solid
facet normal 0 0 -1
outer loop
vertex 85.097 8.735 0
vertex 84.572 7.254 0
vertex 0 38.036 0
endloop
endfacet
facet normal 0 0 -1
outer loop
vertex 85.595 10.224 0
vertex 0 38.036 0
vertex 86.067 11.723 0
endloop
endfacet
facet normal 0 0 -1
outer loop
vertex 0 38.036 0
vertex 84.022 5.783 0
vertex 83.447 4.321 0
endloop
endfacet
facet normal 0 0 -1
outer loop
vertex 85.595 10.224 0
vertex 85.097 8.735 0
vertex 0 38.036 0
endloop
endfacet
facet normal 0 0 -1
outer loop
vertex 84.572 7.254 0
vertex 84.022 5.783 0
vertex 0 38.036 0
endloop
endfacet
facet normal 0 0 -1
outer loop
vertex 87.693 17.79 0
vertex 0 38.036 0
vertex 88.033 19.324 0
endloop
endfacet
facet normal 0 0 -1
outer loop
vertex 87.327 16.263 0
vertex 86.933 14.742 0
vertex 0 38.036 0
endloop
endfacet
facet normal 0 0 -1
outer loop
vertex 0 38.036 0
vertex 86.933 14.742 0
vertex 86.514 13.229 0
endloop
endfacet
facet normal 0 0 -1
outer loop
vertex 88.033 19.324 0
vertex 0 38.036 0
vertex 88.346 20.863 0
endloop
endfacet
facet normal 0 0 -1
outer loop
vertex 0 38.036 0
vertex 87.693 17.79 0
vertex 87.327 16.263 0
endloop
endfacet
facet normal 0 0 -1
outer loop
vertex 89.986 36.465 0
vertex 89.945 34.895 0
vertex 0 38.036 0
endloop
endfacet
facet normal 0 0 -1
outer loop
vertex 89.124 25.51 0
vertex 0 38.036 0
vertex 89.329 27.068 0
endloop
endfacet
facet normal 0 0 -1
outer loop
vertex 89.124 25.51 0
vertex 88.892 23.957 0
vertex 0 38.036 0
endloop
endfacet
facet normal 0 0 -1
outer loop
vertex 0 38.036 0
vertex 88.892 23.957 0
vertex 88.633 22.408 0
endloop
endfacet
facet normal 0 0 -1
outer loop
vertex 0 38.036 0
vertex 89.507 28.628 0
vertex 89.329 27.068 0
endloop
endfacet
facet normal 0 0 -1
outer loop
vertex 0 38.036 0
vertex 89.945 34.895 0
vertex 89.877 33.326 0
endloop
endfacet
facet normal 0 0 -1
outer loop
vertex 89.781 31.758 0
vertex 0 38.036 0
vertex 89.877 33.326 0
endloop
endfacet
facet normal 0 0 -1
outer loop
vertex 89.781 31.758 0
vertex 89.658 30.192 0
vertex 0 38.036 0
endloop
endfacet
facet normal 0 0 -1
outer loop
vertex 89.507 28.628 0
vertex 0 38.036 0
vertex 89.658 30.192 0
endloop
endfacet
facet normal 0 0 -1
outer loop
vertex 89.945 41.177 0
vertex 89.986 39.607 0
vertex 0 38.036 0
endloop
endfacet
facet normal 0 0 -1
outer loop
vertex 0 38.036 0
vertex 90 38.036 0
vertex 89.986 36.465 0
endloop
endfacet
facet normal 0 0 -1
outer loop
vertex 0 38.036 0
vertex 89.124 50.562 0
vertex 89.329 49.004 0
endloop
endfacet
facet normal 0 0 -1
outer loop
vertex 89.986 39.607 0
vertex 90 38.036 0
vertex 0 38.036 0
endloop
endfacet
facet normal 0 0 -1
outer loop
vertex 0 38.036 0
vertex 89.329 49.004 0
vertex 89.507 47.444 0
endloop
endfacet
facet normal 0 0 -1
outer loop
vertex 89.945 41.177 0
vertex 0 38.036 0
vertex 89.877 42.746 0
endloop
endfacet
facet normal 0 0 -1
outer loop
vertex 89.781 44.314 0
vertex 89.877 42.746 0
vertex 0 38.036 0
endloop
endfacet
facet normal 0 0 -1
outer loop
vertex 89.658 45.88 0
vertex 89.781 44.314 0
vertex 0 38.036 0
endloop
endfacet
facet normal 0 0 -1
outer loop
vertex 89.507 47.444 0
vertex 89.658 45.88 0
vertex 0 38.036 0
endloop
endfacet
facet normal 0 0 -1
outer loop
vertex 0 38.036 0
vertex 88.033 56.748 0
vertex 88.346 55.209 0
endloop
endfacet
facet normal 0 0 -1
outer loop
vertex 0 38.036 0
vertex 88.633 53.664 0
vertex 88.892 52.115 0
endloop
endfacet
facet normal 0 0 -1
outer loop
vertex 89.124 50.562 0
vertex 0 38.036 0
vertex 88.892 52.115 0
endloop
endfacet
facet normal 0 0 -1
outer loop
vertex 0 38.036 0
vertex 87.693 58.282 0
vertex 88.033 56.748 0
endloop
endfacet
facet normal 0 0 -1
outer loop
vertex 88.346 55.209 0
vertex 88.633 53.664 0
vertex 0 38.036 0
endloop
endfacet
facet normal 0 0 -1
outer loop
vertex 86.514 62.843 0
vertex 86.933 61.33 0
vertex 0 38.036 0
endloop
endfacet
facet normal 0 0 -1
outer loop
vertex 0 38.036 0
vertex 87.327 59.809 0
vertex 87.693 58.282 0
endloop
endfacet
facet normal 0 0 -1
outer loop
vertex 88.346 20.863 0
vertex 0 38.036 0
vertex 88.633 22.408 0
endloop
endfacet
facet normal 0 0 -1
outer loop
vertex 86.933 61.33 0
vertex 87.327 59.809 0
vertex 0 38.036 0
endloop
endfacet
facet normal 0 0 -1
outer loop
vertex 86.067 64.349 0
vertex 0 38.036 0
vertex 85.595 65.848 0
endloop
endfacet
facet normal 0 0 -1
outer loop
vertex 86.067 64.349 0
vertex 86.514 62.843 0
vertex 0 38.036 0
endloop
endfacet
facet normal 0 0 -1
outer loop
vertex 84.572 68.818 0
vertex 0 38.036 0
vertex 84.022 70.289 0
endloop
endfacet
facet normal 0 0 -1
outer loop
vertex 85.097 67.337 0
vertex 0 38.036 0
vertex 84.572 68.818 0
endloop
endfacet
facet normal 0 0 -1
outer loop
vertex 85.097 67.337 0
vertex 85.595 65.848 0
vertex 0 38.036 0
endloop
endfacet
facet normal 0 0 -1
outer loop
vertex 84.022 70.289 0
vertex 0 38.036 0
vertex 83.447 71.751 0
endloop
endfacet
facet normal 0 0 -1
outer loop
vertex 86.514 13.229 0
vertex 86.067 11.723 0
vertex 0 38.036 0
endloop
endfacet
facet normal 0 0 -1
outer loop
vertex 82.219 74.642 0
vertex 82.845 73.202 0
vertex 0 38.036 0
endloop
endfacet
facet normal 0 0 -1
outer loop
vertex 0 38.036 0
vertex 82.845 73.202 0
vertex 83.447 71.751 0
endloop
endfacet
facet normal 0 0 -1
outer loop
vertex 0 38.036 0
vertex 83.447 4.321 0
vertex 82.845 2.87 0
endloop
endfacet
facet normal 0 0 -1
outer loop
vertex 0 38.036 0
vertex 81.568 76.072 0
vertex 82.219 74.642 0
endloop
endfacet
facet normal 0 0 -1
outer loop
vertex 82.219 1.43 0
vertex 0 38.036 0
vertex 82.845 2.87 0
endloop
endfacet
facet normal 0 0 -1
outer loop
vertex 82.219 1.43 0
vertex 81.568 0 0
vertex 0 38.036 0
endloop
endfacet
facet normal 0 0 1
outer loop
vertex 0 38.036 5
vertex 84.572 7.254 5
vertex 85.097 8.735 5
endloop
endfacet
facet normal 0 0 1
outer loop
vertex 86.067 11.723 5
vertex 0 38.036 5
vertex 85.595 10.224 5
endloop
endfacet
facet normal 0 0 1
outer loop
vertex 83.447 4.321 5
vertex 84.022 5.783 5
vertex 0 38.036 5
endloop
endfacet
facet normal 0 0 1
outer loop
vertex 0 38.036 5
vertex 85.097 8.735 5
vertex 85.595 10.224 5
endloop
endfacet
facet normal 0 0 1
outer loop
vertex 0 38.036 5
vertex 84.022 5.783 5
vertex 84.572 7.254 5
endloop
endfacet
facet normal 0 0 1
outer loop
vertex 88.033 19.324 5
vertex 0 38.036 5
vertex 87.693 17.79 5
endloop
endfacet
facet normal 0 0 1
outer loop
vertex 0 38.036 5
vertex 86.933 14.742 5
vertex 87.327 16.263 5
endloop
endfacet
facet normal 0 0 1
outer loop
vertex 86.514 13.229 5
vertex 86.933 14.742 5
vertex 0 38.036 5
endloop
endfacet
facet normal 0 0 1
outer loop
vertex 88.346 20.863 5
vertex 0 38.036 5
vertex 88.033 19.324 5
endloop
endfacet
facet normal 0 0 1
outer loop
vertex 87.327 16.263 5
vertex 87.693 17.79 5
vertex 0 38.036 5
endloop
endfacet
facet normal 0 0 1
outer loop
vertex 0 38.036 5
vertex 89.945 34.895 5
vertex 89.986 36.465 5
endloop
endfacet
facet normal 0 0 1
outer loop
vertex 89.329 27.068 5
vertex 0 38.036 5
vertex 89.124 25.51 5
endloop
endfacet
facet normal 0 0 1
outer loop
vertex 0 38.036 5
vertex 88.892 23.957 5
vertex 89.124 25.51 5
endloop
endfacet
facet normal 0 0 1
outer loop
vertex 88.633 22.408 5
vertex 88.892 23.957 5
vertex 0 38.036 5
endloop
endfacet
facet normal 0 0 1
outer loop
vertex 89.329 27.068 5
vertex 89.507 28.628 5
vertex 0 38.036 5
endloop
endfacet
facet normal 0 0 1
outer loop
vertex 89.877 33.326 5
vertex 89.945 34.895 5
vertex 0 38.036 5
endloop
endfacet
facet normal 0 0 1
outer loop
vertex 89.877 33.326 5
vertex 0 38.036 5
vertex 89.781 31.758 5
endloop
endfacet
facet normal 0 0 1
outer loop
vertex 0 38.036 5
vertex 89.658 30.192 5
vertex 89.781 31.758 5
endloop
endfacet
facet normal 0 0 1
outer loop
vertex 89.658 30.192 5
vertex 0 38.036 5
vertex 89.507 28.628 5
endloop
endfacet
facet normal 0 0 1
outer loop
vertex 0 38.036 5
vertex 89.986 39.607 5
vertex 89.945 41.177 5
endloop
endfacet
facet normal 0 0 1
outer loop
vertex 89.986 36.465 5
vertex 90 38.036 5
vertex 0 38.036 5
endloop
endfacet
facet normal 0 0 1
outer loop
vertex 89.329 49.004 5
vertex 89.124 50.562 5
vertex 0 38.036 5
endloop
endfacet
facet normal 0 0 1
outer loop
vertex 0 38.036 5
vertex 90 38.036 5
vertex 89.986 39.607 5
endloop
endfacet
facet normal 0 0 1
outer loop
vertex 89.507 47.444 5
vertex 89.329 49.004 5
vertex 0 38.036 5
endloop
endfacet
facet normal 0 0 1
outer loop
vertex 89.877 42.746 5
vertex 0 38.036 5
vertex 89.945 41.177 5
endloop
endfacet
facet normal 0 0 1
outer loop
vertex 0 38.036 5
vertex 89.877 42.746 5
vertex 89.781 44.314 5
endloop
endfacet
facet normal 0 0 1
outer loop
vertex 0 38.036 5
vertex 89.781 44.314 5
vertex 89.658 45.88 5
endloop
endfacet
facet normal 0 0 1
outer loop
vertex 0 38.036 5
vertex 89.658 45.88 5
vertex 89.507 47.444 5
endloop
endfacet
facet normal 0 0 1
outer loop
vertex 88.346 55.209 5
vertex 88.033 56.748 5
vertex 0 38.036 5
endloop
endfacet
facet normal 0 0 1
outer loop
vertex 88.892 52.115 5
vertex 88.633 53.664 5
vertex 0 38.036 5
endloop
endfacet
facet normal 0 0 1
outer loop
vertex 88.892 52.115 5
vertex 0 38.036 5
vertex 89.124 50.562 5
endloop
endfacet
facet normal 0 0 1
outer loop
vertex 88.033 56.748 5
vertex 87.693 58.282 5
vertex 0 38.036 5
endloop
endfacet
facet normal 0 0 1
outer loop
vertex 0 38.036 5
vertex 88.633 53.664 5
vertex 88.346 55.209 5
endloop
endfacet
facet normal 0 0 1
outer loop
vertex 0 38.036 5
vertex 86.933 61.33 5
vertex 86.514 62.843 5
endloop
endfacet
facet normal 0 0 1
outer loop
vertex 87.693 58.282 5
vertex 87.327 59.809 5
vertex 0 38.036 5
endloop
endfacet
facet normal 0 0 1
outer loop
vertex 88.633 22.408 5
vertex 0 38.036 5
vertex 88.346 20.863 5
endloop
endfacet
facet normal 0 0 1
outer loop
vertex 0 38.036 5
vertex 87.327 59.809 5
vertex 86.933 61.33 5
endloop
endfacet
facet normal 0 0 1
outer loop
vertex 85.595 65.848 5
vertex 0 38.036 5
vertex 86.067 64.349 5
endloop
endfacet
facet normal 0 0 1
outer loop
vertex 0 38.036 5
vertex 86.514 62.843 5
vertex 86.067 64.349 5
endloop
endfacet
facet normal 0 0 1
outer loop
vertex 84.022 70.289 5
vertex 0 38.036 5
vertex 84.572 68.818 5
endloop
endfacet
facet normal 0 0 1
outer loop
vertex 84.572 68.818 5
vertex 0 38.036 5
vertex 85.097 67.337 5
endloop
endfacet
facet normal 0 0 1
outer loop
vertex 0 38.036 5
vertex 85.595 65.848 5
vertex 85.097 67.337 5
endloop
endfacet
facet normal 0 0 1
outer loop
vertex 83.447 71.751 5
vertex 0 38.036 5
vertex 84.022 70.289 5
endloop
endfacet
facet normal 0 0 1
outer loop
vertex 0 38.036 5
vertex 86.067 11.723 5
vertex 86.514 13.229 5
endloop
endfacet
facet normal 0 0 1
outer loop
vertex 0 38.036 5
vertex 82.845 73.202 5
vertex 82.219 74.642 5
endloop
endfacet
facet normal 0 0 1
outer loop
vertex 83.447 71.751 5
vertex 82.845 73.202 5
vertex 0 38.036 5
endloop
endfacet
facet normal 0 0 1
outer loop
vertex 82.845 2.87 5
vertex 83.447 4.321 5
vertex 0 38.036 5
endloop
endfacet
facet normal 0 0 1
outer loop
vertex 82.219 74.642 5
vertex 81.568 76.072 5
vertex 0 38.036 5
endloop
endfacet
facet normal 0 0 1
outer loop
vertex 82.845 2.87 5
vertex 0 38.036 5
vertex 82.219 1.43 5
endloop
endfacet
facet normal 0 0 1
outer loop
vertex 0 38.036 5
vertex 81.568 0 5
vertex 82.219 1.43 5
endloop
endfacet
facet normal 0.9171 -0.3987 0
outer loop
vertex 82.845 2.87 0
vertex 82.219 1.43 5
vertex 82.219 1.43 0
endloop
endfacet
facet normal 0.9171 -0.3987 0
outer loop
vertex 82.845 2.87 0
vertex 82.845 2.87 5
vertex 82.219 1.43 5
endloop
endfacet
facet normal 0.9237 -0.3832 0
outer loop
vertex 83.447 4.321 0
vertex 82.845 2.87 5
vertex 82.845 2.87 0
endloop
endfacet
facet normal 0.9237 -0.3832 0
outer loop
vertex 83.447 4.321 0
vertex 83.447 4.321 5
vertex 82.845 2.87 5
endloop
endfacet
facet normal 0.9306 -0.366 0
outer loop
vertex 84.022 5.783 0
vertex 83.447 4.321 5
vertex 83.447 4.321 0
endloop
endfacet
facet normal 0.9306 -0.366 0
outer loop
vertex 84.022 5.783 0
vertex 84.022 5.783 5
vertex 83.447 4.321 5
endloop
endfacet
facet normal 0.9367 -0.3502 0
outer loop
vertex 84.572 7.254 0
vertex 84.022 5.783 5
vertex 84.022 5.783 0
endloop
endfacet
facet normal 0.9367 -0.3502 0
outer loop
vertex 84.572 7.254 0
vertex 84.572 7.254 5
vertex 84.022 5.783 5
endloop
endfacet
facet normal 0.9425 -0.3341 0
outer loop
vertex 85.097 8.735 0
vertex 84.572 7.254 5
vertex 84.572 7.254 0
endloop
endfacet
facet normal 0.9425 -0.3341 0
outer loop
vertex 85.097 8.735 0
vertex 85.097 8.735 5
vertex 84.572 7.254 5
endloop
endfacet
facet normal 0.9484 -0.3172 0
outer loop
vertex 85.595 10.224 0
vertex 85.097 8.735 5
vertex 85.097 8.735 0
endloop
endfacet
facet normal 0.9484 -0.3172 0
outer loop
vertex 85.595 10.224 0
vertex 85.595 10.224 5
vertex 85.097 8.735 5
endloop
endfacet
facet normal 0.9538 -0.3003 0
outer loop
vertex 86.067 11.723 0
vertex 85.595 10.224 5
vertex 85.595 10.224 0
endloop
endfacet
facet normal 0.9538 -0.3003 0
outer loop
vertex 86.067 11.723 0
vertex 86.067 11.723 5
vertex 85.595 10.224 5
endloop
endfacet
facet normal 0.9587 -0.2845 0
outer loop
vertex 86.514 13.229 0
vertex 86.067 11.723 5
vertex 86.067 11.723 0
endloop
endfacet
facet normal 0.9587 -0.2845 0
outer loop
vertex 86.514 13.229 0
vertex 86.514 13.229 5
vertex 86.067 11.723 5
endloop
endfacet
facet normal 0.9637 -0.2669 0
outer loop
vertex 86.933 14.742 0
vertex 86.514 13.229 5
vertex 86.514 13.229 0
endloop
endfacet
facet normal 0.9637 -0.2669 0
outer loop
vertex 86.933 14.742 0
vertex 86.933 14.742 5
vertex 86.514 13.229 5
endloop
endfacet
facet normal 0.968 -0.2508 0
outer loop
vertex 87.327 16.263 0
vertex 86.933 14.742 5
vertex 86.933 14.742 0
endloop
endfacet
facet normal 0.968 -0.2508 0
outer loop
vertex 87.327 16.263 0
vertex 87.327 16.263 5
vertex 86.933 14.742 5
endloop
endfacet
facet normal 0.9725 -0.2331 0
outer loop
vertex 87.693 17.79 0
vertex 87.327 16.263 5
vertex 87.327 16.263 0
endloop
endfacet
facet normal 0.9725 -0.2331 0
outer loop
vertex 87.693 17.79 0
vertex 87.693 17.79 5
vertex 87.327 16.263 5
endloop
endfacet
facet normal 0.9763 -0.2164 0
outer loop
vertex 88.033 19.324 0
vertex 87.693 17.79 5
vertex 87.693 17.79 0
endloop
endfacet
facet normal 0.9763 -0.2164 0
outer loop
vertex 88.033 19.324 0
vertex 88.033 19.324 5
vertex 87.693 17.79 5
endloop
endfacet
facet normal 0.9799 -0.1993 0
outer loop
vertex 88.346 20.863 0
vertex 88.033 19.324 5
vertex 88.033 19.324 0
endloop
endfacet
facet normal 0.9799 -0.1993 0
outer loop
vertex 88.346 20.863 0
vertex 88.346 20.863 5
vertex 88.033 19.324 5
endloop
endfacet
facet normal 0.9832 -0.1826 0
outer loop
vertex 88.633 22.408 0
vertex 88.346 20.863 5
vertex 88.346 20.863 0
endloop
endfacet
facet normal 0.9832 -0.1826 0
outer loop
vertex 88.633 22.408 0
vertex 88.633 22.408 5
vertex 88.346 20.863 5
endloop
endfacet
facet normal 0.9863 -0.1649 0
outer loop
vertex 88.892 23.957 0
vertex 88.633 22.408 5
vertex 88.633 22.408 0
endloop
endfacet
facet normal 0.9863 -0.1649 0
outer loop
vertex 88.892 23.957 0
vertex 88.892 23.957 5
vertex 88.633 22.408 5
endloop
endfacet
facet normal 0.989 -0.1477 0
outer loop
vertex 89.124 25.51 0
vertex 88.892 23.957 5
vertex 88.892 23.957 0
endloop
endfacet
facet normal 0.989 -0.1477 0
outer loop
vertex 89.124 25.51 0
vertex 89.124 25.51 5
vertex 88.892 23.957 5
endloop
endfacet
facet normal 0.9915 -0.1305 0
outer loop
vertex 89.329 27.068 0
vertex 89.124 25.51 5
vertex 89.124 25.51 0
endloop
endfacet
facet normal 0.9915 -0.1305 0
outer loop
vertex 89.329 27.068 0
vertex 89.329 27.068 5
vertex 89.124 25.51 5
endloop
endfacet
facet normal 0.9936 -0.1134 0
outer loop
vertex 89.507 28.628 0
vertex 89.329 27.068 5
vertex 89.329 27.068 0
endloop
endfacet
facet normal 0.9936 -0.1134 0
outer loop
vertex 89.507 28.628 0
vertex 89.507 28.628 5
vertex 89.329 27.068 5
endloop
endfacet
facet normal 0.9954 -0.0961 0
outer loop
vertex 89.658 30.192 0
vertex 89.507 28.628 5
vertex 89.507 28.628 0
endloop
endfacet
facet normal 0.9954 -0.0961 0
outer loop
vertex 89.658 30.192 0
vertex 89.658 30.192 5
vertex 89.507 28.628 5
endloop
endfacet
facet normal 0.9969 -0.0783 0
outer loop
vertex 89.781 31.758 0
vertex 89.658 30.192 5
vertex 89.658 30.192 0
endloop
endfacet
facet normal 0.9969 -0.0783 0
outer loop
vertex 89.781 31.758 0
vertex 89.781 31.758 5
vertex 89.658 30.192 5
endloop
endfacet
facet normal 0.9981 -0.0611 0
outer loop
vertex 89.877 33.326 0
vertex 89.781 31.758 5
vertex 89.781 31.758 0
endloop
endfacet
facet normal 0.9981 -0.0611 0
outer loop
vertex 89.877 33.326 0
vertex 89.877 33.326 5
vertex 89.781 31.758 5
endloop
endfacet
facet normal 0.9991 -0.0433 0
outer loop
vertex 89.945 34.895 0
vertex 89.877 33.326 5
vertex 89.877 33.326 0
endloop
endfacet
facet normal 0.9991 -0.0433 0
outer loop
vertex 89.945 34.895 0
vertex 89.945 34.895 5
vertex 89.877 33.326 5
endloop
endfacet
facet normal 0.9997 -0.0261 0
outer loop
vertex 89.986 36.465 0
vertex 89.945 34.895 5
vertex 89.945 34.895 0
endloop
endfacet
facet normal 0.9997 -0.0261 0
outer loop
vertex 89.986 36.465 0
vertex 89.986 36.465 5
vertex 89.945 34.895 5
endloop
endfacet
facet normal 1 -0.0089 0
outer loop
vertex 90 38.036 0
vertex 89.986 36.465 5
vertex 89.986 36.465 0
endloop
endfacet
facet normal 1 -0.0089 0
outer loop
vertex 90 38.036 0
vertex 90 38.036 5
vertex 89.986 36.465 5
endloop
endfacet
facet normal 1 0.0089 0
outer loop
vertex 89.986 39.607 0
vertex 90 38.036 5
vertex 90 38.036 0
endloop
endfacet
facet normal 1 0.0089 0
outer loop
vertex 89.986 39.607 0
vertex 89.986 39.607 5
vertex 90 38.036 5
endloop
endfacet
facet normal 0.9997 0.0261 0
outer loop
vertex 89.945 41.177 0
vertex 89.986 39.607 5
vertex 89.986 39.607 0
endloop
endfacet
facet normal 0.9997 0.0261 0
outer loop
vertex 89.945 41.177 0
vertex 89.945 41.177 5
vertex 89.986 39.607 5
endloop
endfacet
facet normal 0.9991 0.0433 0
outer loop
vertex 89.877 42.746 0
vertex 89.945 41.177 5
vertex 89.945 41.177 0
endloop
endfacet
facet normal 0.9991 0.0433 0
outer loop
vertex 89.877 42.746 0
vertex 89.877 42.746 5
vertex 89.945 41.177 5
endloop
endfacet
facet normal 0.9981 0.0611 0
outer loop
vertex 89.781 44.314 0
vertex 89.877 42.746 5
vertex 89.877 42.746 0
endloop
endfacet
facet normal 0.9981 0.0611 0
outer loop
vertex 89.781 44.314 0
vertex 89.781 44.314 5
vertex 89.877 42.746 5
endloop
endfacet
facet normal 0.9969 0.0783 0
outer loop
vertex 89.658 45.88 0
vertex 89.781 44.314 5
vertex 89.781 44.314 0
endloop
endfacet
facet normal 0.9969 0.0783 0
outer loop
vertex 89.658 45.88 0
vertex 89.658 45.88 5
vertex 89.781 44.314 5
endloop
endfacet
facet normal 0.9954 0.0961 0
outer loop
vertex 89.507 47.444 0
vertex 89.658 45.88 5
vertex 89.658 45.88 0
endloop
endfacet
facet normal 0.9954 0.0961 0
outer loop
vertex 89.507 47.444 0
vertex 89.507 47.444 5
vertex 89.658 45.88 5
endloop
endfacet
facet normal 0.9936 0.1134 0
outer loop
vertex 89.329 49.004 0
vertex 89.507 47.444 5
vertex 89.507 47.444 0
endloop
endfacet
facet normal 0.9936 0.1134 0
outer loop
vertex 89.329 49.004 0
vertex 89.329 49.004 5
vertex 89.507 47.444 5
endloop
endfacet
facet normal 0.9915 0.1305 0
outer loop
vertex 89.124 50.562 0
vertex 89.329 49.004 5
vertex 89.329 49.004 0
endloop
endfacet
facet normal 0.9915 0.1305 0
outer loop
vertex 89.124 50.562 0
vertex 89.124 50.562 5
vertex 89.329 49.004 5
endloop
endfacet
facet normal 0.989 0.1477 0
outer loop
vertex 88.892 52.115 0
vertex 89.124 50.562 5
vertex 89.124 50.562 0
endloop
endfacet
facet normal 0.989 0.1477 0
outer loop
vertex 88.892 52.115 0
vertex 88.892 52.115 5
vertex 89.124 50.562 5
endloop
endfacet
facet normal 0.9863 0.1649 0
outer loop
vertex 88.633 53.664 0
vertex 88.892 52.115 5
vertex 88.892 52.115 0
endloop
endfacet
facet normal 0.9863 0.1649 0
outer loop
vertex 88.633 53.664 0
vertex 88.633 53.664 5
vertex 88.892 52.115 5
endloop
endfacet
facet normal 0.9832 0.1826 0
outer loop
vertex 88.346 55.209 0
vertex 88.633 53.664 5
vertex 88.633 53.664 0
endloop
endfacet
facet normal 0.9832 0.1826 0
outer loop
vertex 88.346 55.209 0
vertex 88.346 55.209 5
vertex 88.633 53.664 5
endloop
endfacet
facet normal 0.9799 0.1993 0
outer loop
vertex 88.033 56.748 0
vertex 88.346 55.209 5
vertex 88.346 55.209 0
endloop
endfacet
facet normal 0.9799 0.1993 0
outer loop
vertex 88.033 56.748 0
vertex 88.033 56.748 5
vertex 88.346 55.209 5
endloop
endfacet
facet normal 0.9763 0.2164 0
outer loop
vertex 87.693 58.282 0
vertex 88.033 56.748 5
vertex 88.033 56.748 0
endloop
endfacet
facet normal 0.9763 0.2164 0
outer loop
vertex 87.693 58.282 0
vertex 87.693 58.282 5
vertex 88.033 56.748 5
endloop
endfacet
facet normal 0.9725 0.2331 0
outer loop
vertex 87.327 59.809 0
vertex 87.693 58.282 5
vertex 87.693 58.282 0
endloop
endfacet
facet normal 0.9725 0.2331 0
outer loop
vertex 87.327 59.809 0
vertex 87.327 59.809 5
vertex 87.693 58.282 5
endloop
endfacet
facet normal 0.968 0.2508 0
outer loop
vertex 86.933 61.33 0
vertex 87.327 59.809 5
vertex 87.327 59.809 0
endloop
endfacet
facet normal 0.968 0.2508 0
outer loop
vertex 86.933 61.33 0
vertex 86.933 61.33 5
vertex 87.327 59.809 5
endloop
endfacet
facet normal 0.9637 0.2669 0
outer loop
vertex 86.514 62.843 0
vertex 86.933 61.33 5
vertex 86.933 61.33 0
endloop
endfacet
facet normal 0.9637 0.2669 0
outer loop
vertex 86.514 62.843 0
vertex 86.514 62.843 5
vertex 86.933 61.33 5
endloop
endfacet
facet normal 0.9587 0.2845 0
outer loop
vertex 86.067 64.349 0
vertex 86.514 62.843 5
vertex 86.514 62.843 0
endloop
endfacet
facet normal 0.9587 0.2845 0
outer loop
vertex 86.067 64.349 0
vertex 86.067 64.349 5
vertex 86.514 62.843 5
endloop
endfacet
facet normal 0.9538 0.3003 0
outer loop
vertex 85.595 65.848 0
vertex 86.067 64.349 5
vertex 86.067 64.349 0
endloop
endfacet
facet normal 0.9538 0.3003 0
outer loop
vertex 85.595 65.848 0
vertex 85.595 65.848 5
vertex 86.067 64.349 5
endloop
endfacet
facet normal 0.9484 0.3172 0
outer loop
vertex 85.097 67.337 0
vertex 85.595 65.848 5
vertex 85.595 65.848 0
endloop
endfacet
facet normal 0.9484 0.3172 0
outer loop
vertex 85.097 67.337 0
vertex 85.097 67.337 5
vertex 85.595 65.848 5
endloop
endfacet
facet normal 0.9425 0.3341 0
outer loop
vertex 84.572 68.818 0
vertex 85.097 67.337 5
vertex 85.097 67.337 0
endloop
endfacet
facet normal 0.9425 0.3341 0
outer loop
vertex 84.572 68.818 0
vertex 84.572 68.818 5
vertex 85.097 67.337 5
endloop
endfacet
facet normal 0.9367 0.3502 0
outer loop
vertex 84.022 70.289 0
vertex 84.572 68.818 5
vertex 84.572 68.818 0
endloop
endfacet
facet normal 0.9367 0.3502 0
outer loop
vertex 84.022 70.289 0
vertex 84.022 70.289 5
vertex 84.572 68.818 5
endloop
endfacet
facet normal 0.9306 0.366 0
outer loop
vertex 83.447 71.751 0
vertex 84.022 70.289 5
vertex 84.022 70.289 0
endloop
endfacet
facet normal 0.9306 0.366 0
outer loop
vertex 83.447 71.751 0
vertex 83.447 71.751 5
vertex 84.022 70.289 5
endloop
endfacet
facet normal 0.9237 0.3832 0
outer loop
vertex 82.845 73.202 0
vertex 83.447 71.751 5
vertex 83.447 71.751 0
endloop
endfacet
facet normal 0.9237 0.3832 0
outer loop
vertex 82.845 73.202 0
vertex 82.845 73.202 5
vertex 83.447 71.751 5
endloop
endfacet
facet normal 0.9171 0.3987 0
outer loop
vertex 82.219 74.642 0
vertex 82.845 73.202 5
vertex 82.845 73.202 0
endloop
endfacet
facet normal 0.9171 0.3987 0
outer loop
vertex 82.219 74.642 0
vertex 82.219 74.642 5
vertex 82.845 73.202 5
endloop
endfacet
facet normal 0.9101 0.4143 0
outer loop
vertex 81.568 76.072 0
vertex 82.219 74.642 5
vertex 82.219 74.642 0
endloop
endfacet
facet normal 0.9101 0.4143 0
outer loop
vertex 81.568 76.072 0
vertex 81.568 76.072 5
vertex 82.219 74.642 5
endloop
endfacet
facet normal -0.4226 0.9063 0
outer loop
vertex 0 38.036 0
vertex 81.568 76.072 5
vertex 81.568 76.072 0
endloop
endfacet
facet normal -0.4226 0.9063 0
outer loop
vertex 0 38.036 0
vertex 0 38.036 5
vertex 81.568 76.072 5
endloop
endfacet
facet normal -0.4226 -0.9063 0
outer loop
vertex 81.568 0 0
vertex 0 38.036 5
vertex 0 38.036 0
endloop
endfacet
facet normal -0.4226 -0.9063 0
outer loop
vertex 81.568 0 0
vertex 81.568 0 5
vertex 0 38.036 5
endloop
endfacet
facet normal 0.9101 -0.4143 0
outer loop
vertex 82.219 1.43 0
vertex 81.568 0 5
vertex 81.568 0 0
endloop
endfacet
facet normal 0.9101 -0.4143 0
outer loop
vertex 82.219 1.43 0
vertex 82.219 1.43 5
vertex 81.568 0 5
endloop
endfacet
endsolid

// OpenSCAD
$fn = 32;

// ----------------------------------------------------------------------
// Arc profile plate: sector, 52 points
// ----------------------------------------------------------------------

// --- parameters (mm) ---
sector_angle = 50;        // sector angle, degrees
sector_r = 90;            // outer radius
arc_step = 1;             // sampling step of the arc, degrees
plate_t = 5;              // plate thickness, Z

bbox_x = 2 * sector_r * sin(sector_angle / 2);  // chord of the sector
bbox_y = sector_r;  // depth of the sector (apex to arc)

profile = [[81.568, 0], [82.219, 1.43], [82.845, 2.87], [83.447, 4.321], [84.022, 5.783], [84.572, 7.254], [85.097, 8.735], [85.595, 10.224], [86.067, 11.723], [86.514, 13.229], [86.933, 14.742], [87.327, 16.263], [87.693, 17.79], [88.033, 19.324], [88.346, 20.863], [88.633, 22.408], [88.892, 23.957], [89.124, 25.51], [89.329, 27.068], [89.507, 28.628], [89.658, 30.192], [89.781, 31.758], [89.877, 33.326], [89.945, 34.895], [89.986, 36.465], [90, 38.036], [89.986, 39.607], [89.945, 41.177], [89.877, 42.746], [89.781, 44.314], [89.658, 45.88], [89.507, 47.444], [89.329, 49.004], [89.124, 50.562], [88.892, 52.115], [88.633, 53.664], [88.346, 55.209], [88.033, 56.748], [87.693, 58.282], [87.327, 59.809], [86.933, 61.33], [86.514, 62.843], [86.067, 64.349], [85.595, 65.848], [85.097, 67.337], [84.572, 68.818], [84.022, 70.289], [83.447, 71.751], [82.845, 73.202], [82.219, 74.642], [81.568, 76.072], [0, 38.036]];  // primary outline, 52 points, counter clockwise

// --- the one profile operation ---
linear_extrude(height = plate_t) polygon(points = profile);
